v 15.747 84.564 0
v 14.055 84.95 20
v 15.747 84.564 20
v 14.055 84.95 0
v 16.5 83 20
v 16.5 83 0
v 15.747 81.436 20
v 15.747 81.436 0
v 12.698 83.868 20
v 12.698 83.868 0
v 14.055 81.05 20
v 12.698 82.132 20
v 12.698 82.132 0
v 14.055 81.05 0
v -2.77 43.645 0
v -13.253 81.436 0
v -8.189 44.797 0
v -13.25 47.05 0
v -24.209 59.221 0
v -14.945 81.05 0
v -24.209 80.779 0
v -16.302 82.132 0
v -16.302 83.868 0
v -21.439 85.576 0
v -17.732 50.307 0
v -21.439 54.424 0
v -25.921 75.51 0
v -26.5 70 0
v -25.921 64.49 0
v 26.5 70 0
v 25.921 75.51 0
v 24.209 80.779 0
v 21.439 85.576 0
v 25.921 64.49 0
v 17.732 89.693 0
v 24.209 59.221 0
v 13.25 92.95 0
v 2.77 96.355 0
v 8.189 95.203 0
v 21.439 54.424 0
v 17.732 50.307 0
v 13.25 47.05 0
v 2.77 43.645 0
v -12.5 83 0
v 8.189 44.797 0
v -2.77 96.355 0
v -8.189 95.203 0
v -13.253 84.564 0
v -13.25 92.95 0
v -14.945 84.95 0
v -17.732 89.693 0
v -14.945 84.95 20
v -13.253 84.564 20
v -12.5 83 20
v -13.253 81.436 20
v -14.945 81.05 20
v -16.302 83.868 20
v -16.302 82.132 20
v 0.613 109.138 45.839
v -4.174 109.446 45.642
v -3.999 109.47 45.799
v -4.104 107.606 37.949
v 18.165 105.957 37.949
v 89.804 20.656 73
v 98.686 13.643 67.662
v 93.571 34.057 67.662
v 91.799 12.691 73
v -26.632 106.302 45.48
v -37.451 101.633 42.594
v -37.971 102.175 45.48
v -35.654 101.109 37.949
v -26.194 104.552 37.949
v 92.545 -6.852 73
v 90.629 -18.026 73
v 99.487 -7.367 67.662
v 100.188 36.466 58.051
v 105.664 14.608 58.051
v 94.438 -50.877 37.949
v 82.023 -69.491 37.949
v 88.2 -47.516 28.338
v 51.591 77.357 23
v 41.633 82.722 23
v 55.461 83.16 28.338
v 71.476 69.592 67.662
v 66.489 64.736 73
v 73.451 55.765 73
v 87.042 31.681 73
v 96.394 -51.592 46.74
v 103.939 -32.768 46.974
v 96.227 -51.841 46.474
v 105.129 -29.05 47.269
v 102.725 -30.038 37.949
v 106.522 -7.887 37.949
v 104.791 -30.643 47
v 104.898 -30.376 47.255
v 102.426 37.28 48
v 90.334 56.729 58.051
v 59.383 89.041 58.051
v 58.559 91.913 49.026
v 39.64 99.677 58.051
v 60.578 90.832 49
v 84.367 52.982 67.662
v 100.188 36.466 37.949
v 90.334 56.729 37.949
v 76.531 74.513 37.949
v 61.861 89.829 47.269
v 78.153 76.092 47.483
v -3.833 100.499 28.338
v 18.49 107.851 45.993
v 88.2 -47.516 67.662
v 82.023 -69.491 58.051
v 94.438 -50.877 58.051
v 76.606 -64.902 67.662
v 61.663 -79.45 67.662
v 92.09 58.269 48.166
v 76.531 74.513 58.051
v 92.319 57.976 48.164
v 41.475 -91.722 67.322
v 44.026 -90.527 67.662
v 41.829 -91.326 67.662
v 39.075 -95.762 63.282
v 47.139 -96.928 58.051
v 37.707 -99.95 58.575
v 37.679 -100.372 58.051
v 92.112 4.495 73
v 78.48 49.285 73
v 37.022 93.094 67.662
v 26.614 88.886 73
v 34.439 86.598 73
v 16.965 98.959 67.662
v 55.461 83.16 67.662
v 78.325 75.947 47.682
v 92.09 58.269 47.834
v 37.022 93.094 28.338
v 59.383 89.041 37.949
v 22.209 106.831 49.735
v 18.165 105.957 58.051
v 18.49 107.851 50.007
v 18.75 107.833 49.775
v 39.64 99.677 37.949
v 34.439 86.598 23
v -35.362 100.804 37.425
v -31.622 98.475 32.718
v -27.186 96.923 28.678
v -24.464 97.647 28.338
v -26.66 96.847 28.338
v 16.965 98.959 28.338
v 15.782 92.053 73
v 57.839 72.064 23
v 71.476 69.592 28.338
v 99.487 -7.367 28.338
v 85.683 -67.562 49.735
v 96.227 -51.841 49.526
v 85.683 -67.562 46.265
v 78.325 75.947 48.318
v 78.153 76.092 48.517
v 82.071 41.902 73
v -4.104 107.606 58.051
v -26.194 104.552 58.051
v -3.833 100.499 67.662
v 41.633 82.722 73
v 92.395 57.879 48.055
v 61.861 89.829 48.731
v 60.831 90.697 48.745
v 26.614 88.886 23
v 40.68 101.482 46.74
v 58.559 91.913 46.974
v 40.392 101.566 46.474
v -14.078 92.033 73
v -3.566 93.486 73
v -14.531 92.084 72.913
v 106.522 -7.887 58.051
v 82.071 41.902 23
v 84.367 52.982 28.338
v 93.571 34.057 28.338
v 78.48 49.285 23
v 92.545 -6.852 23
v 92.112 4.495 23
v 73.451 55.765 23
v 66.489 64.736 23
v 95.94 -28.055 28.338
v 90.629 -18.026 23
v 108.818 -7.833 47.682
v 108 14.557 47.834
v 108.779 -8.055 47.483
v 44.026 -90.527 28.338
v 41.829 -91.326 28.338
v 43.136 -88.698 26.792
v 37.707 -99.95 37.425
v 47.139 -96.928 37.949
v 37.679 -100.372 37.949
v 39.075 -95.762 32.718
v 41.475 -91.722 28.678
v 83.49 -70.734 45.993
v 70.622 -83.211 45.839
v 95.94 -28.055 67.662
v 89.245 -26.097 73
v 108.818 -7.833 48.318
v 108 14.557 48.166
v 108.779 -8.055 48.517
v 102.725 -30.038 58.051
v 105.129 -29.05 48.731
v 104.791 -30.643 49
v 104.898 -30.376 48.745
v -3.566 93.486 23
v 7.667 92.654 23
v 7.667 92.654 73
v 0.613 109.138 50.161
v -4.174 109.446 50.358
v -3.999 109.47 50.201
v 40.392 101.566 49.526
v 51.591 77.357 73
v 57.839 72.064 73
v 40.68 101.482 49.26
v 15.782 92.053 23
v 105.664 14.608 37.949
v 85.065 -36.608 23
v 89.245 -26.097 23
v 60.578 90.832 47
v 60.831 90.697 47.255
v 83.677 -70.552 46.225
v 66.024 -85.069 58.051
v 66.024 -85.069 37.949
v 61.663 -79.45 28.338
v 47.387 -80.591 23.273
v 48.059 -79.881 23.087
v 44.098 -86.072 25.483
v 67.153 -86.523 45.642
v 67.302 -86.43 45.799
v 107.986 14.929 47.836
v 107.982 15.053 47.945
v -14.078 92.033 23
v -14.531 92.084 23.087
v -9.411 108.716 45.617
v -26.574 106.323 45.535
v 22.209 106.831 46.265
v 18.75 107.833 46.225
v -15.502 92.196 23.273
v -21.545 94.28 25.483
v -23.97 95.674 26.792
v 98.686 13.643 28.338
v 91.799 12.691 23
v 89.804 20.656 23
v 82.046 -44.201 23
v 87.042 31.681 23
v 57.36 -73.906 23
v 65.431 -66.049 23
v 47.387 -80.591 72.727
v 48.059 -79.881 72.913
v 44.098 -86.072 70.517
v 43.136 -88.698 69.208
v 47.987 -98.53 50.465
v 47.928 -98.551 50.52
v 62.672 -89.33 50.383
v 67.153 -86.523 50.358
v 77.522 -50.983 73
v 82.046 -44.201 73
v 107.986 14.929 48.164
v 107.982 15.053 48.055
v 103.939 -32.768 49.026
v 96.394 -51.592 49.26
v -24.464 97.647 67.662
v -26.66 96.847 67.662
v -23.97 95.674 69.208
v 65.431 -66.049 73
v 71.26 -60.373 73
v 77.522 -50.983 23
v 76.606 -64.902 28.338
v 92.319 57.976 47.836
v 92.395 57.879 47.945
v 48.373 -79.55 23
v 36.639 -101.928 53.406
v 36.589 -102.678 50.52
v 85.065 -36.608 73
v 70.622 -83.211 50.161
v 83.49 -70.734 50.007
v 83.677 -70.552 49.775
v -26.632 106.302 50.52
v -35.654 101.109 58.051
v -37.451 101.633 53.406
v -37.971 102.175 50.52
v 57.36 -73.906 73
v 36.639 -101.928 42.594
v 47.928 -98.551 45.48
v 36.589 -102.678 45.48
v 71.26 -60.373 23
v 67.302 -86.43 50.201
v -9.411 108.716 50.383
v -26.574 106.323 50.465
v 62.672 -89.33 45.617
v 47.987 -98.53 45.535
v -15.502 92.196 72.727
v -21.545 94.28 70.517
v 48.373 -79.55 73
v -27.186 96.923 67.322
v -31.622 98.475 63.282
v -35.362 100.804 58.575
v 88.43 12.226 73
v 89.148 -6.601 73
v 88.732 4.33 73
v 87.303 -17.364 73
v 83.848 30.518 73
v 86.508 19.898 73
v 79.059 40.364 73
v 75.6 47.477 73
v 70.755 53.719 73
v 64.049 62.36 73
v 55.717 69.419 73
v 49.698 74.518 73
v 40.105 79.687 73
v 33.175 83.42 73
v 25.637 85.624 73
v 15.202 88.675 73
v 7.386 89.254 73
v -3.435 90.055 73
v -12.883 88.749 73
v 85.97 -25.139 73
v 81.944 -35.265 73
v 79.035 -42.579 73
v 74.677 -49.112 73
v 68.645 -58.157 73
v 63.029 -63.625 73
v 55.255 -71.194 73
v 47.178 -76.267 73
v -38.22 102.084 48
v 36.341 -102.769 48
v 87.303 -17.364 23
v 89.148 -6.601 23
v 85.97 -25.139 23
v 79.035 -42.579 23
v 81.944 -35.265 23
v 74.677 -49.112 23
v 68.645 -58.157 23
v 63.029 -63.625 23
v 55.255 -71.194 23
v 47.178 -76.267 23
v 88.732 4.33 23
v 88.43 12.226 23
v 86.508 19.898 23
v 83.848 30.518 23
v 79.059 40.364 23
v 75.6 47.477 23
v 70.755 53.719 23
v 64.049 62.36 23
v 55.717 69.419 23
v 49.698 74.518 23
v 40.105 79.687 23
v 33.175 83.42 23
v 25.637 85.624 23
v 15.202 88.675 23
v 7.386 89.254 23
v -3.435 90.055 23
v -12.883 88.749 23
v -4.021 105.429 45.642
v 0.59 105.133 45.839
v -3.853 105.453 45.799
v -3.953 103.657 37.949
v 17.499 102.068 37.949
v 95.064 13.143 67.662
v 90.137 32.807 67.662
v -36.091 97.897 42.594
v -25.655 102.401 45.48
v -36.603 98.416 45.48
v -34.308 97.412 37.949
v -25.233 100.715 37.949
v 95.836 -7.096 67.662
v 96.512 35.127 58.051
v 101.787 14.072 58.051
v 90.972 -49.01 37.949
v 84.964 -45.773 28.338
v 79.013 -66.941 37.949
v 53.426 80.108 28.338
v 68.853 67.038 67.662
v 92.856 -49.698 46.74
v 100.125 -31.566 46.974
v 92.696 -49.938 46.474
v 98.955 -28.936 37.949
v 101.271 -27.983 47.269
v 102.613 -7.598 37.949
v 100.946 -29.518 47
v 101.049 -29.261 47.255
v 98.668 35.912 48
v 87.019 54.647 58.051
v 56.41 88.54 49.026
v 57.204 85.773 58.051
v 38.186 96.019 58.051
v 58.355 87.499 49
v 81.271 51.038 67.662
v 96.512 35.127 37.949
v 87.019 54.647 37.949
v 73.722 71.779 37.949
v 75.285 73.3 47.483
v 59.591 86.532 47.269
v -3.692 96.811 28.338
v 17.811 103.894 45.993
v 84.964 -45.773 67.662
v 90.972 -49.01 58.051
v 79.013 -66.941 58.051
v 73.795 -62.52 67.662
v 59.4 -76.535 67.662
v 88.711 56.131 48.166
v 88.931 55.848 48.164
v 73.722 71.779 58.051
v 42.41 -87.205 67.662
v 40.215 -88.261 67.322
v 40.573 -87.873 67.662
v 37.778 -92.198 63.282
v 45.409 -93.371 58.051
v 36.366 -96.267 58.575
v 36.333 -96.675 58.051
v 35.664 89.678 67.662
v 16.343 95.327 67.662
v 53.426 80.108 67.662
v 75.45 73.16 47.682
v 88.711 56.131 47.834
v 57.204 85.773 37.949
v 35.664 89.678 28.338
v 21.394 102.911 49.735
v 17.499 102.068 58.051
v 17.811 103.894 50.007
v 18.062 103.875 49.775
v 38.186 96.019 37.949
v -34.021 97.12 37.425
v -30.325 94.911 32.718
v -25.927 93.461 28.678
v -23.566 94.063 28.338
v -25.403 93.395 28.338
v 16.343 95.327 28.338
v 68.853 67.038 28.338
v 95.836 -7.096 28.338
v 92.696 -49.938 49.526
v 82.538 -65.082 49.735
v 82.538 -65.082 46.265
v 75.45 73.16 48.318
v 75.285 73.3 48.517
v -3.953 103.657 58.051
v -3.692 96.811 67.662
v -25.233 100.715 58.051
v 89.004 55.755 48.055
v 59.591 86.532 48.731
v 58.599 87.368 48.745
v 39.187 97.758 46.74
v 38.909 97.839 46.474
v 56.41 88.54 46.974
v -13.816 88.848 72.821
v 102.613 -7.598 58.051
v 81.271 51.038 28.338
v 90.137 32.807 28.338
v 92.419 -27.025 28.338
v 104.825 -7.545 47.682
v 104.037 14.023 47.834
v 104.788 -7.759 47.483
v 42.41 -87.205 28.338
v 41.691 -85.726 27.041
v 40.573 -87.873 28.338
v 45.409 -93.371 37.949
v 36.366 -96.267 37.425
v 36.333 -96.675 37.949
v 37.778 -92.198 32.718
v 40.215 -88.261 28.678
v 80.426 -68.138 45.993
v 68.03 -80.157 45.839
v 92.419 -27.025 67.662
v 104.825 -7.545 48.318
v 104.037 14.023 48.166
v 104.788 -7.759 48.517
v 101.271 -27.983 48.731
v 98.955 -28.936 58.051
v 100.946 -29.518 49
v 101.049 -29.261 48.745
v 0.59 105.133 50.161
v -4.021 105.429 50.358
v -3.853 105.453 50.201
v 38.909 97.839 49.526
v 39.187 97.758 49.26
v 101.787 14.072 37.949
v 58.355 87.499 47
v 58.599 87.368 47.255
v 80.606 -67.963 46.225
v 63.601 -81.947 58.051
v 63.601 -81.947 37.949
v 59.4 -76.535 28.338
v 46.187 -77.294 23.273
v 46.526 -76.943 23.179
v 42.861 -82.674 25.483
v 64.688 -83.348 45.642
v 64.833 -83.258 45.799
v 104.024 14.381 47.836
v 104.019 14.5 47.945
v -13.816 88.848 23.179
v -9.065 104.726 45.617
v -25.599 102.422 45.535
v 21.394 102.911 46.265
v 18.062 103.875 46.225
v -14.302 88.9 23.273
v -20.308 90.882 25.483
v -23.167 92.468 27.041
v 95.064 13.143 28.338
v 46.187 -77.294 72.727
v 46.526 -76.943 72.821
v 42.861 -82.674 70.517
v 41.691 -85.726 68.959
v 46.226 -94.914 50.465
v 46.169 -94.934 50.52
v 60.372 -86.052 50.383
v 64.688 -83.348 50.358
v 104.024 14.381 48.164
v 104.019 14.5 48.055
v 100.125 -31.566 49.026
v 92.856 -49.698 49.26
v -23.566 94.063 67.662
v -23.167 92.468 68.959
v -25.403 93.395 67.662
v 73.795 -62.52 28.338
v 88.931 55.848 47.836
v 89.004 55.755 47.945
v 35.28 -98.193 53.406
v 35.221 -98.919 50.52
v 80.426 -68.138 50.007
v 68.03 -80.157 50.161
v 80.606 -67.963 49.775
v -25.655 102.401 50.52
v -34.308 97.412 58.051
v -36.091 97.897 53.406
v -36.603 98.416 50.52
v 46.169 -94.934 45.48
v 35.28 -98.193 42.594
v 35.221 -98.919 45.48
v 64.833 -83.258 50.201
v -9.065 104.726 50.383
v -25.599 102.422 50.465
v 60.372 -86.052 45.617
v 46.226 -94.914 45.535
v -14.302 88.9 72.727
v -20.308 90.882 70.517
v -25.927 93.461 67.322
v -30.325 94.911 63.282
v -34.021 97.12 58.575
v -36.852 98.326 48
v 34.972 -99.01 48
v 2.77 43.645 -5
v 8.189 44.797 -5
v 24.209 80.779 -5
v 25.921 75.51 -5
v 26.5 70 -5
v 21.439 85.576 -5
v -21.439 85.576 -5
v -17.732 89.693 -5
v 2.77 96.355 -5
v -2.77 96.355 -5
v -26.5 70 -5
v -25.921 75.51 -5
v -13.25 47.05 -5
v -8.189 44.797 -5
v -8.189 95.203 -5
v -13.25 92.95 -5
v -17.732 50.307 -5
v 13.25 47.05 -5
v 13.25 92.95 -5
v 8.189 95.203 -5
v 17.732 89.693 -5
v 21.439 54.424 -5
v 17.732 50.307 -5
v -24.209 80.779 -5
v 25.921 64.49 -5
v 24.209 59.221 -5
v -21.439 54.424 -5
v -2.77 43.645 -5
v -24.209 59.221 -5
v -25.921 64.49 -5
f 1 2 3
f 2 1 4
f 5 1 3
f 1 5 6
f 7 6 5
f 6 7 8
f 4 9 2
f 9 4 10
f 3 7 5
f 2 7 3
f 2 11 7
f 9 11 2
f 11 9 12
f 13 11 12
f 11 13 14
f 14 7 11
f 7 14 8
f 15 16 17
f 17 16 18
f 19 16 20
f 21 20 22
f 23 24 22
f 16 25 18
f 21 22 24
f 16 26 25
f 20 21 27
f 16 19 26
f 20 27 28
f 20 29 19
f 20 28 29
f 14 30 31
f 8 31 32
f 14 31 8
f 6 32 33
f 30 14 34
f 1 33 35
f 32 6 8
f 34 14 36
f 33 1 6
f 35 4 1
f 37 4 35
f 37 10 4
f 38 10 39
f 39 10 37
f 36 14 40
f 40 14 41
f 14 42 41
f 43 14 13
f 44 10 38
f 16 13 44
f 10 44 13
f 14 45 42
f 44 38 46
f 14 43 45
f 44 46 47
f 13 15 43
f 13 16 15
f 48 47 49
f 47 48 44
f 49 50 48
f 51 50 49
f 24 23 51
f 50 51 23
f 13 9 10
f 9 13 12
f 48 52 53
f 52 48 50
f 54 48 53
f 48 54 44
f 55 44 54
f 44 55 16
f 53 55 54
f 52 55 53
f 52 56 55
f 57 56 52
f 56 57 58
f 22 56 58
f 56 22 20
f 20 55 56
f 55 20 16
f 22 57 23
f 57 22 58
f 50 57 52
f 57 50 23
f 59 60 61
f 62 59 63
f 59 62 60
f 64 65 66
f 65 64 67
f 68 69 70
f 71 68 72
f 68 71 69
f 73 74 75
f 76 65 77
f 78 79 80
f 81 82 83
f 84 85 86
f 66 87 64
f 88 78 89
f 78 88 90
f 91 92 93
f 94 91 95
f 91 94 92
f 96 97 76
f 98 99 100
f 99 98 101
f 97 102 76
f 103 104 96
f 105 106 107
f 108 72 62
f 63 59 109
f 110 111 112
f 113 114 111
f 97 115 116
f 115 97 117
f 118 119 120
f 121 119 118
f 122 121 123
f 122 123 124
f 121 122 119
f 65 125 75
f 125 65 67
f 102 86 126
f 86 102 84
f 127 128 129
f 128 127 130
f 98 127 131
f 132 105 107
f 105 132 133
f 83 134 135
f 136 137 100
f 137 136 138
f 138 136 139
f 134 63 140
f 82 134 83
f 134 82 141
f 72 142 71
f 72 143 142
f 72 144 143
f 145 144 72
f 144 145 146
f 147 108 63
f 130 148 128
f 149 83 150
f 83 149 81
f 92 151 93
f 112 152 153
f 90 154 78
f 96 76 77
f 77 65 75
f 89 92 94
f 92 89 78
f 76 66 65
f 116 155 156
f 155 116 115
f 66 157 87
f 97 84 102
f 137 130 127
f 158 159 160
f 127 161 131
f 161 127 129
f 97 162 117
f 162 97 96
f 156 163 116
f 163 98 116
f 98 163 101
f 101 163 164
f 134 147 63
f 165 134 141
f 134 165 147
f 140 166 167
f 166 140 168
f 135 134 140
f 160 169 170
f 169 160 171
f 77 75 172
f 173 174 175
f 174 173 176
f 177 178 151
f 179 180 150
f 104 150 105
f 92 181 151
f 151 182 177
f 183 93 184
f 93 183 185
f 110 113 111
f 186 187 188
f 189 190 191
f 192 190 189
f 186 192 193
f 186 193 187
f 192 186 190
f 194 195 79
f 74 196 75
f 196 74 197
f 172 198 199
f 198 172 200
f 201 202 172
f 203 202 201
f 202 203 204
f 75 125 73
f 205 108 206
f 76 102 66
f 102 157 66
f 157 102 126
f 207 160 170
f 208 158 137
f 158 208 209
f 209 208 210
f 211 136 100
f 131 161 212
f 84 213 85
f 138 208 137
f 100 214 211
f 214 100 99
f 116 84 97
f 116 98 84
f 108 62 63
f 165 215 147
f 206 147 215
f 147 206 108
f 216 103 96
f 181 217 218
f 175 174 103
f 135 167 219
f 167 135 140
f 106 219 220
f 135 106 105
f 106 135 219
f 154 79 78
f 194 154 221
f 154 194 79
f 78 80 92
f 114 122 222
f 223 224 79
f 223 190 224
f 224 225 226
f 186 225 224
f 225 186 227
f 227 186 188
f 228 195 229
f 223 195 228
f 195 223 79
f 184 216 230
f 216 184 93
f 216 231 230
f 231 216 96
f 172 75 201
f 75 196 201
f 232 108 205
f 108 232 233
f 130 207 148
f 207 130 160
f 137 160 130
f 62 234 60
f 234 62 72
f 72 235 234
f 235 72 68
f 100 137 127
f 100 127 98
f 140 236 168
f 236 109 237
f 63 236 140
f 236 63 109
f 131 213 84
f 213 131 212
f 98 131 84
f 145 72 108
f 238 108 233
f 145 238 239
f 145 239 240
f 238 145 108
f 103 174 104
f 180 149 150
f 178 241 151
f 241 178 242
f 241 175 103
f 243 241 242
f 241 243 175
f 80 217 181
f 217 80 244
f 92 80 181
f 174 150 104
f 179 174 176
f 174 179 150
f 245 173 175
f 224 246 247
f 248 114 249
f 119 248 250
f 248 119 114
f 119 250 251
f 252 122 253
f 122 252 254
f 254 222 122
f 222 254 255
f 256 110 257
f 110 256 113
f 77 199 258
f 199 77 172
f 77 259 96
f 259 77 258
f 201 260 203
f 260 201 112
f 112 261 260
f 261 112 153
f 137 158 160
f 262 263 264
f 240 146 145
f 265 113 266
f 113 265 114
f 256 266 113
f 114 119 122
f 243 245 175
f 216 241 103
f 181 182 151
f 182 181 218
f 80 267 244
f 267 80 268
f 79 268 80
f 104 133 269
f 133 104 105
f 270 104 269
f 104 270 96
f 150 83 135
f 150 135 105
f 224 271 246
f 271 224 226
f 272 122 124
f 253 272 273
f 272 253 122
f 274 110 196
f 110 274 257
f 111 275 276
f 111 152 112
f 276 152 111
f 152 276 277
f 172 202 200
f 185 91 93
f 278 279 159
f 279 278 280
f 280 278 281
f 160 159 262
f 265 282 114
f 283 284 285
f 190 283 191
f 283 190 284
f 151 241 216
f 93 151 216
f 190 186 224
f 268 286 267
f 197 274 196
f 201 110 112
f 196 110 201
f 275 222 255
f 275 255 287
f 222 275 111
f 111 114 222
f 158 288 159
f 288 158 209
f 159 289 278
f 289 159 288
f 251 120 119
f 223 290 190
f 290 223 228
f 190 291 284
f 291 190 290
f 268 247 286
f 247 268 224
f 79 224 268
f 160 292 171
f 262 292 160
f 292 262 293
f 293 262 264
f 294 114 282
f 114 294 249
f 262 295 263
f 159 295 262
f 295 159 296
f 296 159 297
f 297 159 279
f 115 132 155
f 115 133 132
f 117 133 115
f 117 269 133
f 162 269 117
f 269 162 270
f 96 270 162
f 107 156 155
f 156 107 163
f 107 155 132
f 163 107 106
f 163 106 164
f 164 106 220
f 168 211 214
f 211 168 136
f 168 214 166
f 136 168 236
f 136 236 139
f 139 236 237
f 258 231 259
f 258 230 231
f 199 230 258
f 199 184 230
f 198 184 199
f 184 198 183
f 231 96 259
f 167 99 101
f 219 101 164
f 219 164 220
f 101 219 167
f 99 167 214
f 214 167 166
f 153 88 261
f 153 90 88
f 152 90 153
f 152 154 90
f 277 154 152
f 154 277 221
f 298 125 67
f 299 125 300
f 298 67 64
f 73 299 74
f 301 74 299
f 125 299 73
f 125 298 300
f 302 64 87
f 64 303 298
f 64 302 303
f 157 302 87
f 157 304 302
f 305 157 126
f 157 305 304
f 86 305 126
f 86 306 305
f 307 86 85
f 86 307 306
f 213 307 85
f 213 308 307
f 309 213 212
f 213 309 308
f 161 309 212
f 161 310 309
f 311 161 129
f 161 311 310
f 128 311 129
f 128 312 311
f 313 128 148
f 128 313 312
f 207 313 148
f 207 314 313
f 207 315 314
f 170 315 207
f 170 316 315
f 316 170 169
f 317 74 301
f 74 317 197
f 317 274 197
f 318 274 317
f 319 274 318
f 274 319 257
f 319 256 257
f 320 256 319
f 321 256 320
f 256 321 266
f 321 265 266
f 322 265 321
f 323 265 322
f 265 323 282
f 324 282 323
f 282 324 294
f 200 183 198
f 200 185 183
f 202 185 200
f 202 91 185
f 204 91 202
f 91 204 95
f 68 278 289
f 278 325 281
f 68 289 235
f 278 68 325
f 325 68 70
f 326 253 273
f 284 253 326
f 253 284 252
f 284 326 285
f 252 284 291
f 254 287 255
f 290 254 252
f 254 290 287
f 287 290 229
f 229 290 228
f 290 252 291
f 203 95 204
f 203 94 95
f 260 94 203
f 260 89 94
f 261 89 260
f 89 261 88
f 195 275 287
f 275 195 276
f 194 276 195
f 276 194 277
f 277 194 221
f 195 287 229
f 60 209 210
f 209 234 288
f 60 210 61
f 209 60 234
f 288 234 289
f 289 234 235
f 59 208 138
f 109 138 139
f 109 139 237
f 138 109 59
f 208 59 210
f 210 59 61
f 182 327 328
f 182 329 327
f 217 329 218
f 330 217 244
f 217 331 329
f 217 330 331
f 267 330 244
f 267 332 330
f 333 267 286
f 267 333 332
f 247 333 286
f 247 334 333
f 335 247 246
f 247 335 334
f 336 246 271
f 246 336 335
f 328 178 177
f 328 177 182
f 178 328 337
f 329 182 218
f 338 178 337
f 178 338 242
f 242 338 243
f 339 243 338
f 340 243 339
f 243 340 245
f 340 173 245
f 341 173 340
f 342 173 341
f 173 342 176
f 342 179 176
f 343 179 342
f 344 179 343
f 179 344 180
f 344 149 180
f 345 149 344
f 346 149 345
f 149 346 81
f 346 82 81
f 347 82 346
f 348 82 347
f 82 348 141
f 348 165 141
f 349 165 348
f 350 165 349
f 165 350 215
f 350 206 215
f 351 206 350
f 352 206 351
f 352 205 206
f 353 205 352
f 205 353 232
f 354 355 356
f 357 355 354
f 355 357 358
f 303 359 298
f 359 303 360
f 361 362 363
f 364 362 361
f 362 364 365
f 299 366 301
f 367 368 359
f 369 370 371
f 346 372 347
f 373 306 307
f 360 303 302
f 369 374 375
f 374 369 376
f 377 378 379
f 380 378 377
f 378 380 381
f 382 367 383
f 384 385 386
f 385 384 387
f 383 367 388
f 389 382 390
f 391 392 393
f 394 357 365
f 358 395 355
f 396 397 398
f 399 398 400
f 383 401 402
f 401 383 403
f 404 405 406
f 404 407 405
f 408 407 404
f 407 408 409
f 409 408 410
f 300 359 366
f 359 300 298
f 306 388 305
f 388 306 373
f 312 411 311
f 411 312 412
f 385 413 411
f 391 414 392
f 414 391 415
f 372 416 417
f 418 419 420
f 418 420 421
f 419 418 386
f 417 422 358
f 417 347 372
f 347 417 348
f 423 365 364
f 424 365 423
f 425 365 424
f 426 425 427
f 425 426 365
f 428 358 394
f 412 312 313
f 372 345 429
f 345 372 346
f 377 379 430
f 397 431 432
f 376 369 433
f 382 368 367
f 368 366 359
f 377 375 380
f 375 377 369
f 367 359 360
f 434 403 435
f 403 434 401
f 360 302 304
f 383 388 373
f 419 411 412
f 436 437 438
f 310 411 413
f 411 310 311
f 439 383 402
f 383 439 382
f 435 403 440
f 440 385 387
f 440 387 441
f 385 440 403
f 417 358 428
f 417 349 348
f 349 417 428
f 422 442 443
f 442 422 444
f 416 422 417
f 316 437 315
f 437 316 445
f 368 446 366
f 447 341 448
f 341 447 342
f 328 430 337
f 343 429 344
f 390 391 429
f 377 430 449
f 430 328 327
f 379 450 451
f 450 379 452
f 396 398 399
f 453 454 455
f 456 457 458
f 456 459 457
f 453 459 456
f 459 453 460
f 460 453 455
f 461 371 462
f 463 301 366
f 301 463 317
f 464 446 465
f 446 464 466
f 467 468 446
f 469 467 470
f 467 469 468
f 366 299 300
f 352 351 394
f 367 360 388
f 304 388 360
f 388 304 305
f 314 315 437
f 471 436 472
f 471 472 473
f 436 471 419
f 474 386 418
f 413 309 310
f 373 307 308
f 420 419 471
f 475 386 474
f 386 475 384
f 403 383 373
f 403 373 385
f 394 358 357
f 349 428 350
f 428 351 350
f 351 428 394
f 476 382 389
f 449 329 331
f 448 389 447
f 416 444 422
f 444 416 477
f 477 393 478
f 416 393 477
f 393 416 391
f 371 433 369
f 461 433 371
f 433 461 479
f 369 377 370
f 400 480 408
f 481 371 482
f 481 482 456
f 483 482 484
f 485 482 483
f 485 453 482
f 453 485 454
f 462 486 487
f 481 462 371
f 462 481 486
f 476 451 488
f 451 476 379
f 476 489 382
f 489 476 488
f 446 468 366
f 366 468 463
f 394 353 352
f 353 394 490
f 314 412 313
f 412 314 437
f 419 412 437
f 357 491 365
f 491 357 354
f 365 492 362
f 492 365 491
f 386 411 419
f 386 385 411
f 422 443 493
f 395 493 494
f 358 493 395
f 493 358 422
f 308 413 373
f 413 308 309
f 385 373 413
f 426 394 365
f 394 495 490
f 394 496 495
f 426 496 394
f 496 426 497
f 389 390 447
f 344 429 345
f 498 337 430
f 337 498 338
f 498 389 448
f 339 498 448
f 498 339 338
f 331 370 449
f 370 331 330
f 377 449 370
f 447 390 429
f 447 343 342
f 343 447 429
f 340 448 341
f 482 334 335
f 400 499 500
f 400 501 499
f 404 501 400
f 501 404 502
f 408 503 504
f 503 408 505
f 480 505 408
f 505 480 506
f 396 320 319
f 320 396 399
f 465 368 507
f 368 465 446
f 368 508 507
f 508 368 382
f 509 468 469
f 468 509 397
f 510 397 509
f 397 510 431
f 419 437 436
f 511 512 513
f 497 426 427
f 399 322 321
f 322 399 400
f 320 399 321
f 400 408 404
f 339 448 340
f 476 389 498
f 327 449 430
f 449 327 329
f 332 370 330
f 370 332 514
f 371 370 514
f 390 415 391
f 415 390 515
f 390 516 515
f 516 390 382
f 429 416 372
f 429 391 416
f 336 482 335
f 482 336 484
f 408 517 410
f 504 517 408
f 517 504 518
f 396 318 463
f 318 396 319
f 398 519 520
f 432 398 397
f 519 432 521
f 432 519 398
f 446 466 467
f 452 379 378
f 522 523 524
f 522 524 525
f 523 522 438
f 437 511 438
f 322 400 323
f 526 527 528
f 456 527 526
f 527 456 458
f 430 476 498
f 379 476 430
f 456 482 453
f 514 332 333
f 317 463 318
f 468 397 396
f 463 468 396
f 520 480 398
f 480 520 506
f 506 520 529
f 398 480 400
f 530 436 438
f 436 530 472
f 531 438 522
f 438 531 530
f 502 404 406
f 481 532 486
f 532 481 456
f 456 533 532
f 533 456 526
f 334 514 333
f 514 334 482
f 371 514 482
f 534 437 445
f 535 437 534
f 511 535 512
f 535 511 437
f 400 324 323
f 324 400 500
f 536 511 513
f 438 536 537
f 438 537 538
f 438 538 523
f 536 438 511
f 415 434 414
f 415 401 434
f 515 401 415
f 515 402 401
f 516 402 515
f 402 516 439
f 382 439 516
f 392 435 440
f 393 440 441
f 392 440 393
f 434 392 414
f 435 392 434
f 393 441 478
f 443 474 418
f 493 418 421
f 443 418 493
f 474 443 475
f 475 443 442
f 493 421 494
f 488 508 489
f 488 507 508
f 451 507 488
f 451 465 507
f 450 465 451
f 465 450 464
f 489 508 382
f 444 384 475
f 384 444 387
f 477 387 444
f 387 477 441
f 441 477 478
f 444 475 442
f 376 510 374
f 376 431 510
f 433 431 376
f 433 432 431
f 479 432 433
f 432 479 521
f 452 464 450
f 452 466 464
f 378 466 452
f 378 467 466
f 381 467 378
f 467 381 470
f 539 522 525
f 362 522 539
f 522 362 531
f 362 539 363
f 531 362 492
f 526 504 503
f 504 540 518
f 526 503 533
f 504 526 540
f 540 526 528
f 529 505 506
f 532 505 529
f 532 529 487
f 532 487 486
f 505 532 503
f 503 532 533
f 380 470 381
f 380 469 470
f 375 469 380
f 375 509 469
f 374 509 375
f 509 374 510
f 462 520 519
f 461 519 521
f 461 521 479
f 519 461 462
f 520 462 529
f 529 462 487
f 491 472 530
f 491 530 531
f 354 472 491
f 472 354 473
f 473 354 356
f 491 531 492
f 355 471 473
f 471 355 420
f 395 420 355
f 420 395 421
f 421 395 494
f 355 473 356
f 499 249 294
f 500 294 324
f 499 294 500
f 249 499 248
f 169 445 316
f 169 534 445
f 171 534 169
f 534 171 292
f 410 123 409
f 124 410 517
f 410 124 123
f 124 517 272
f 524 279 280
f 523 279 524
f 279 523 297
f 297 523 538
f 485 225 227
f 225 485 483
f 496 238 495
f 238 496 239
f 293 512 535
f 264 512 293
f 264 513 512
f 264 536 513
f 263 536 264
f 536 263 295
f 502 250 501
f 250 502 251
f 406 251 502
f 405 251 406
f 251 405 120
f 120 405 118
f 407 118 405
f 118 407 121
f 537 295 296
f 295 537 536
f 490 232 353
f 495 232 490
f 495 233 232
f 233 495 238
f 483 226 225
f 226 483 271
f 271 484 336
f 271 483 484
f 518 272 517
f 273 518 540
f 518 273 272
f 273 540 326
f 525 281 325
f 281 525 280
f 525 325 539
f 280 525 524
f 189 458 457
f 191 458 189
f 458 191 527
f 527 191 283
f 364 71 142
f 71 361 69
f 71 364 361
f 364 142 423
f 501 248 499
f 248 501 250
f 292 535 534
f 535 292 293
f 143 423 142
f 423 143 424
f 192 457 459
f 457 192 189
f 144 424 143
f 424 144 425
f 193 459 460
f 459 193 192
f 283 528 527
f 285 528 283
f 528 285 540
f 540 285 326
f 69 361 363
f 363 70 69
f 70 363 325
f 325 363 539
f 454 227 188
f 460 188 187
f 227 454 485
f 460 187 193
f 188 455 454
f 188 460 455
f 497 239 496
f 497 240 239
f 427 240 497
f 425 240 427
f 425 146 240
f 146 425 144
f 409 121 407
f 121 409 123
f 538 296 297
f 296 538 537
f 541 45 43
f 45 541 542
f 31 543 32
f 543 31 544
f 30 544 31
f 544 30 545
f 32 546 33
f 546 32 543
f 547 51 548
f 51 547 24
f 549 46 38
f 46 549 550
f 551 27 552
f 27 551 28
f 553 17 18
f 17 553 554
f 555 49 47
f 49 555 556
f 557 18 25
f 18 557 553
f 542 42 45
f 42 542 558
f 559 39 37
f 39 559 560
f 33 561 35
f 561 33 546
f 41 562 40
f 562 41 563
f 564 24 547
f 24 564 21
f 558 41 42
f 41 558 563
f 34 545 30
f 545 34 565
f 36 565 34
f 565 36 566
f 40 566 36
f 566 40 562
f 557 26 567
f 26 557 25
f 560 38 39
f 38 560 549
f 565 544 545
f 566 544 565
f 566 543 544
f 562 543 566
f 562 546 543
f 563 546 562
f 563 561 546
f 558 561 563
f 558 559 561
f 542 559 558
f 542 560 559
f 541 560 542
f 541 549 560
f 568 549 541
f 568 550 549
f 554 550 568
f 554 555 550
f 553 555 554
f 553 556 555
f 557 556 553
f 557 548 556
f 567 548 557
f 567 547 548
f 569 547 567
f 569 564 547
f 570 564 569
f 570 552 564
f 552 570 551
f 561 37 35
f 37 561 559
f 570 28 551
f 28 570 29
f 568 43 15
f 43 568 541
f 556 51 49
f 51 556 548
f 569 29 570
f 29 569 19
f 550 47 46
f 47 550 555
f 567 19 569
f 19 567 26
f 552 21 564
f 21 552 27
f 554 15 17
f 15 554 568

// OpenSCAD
wheel_outer_radus = 90;
wheel_inner_max_radius = 65;
wheel_width = 52;
dist_btw_mount_bolts = 29;
mount_block_diameter = 53;
hub_to_mount_bolt_hole = 83;
m4_bolt_hole_radius = 2;
motor_mount_to_wheel_centre = 48;

mudguard_thickness = 4;
mudguard_inner_radus = wheel_outer_radus + 15;
mudguard_outer_radus = mudguard_inner_radus + mudguard_thickness;

//unknowns
motor_mount_angle=20;


translate([0,0,motor_mount_to_wheel_centre])
%wheel2();
mounting_holes();
mounting_bracket();
mudguard();

module mudguard() {
    rotate([0,0,20])
    intersection() {
        difference() {
            translate([0,0,motor_mount_to_wheel_centre])
            resize([mudguard_outer_radus*2, mudguard_outer_radus*2, 50])
            wheel2();

            translate([0,0,motor_mount_to_wheel_centre])
            resize([mudguard_inner_radus*2, mudguard_inner_radus*2, 50])
            wheel2();
        }
        translate([25,mudguard_outer_radus,motor_mount_to_wheel_centre])
        rotate([90,0,0])
        {
            cylinder(mudguard_outer_radus*2, wheel_width/2, wheel_width/2);
            translate([0,-wheel_width/2,0])
            cube([mudguard_outer_radus*2,wheel_width,mudguard_outer_radus*2],false);
        }
    }
}

module mounting_bracket() {
    translate([0,70,-5])
    cylinder(5, mount_block_diameter/2, mount_block_diameter/2);
}

module mounting_holes() {
    translate([0,hub_to_mount_bolt_hole,0])
    {
        translate([dist_btw_mount_bolts/2,0,0])
        m4_bolt(20);
        translate([-dist_btw_mount_bolts/2,0,0])
        m4_bolt(20);
    }
}

module m4_bolt(length) {
    cylinder(length, m4_bolt_hole_radius, m4_bolt_hole_radius);
}

module wheel2() {
    intersection() {
        resize([wheel_outer_radus*2,wheel_outer_radus*2,100])sphere(wheel_outer_radus);
        cylinder(wheel_width, wheel_outer_radus, wheel_outer_radus, true);
    }
}

module wheel() {
    wheel_half();
    rotate([180,0,0])wheel_half();
    
}

module wheel_half() {
    cylinder(wheel_width/2, wheel_outer_radus, 77, false);
}
